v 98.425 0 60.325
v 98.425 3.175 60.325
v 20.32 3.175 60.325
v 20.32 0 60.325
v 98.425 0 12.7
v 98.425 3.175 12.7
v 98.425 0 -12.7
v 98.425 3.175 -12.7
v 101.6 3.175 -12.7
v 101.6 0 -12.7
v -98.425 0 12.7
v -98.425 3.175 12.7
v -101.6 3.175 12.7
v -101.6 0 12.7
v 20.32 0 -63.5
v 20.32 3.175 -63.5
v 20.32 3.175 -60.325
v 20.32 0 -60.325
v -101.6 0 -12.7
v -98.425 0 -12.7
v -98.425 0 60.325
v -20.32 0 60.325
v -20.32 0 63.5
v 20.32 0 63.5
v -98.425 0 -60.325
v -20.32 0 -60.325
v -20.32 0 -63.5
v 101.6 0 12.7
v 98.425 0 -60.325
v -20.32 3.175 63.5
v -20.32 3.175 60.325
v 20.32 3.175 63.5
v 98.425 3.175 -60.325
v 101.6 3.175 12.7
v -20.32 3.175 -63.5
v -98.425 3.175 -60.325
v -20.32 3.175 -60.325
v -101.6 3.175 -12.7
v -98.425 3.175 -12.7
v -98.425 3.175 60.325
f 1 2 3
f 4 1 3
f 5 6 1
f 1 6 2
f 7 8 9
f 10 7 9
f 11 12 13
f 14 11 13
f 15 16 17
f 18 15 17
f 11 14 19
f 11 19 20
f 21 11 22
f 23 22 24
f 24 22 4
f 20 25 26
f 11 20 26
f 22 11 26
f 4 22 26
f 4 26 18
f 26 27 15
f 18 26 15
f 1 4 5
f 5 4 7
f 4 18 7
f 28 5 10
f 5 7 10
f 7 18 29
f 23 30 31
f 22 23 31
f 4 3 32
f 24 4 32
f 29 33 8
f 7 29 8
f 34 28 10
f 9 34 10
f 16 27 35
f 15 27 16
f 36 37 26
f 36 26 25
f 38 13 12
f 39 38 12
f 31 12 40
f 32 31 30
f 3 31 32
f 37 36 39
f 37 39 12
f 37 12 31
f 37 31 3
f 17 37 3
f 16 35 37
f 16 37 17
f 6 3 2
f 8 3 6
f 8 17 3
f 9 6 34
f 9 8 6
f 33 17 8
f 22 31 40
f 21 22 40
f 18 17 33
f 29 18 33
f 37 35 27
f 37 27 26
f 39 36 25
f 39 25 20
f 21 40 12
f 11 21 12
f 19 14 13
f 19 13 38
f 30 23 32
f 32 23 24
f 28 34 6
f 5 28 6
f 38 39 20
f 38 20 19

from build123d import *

# Parameters (mm, degrees)
SKETCH1_W           = 203.2
SKETCH1_H           = 127
BOSS_EXTRUDE1_DEPTH = 3.175
CUT_EXTRUDE1_DEPTH  = 3.175


with BuildPart() as part:
    # Sketch1 → Boss-Extrude1 (new body)
    with BuildSketch(Plane(origin=(0, 0, 0), x_dir=(1, 0, 0), z_dir=(0, 1, 0))):
        Rectangle(SKETCH1_W, SKETCH1_H)
    extrude(amount=BOSS_EXTRUDE1_DEPTH)

    # Sketch3 → Cut-Extrude1 (cut)
    with BuildSketch(Plane(origin=(0, 3.175, 0), x_dir=(1, 0, 0), z_dir=(0, 1, 0))):
        Polygon((-98.425, 12.7), (-101.6, 12.7), (-101.6, 63.5), (-20.32, 63.5), (-20.32, 60.325), (-98.425, 60.325), align=None)
        Polygon((20.32, 60.325), (98.425, 60.325), (98.425, 12.7), (101.6, 12.7), (101.6, 63.5), (20.32, 63.5), align=None)
        Polygon((-101.6, -12.7), (-101.6, -65.513366778), (-20.32, -63.5), (-20.32, -60.325), (-98.425, -60.325), (-98.425, -12.7), align=None)
        Polygon((20.32, -60.325), (20.32, -63.5), (101.6, -63.5), (101.6, -12.7), (98.425, -12.7), (98.425, -60.325), align=None)
    extrude(amount=-CUT_EXTRUDE1_DEPTH, mode=Mode.SUBTRACT)


solid = part.part
